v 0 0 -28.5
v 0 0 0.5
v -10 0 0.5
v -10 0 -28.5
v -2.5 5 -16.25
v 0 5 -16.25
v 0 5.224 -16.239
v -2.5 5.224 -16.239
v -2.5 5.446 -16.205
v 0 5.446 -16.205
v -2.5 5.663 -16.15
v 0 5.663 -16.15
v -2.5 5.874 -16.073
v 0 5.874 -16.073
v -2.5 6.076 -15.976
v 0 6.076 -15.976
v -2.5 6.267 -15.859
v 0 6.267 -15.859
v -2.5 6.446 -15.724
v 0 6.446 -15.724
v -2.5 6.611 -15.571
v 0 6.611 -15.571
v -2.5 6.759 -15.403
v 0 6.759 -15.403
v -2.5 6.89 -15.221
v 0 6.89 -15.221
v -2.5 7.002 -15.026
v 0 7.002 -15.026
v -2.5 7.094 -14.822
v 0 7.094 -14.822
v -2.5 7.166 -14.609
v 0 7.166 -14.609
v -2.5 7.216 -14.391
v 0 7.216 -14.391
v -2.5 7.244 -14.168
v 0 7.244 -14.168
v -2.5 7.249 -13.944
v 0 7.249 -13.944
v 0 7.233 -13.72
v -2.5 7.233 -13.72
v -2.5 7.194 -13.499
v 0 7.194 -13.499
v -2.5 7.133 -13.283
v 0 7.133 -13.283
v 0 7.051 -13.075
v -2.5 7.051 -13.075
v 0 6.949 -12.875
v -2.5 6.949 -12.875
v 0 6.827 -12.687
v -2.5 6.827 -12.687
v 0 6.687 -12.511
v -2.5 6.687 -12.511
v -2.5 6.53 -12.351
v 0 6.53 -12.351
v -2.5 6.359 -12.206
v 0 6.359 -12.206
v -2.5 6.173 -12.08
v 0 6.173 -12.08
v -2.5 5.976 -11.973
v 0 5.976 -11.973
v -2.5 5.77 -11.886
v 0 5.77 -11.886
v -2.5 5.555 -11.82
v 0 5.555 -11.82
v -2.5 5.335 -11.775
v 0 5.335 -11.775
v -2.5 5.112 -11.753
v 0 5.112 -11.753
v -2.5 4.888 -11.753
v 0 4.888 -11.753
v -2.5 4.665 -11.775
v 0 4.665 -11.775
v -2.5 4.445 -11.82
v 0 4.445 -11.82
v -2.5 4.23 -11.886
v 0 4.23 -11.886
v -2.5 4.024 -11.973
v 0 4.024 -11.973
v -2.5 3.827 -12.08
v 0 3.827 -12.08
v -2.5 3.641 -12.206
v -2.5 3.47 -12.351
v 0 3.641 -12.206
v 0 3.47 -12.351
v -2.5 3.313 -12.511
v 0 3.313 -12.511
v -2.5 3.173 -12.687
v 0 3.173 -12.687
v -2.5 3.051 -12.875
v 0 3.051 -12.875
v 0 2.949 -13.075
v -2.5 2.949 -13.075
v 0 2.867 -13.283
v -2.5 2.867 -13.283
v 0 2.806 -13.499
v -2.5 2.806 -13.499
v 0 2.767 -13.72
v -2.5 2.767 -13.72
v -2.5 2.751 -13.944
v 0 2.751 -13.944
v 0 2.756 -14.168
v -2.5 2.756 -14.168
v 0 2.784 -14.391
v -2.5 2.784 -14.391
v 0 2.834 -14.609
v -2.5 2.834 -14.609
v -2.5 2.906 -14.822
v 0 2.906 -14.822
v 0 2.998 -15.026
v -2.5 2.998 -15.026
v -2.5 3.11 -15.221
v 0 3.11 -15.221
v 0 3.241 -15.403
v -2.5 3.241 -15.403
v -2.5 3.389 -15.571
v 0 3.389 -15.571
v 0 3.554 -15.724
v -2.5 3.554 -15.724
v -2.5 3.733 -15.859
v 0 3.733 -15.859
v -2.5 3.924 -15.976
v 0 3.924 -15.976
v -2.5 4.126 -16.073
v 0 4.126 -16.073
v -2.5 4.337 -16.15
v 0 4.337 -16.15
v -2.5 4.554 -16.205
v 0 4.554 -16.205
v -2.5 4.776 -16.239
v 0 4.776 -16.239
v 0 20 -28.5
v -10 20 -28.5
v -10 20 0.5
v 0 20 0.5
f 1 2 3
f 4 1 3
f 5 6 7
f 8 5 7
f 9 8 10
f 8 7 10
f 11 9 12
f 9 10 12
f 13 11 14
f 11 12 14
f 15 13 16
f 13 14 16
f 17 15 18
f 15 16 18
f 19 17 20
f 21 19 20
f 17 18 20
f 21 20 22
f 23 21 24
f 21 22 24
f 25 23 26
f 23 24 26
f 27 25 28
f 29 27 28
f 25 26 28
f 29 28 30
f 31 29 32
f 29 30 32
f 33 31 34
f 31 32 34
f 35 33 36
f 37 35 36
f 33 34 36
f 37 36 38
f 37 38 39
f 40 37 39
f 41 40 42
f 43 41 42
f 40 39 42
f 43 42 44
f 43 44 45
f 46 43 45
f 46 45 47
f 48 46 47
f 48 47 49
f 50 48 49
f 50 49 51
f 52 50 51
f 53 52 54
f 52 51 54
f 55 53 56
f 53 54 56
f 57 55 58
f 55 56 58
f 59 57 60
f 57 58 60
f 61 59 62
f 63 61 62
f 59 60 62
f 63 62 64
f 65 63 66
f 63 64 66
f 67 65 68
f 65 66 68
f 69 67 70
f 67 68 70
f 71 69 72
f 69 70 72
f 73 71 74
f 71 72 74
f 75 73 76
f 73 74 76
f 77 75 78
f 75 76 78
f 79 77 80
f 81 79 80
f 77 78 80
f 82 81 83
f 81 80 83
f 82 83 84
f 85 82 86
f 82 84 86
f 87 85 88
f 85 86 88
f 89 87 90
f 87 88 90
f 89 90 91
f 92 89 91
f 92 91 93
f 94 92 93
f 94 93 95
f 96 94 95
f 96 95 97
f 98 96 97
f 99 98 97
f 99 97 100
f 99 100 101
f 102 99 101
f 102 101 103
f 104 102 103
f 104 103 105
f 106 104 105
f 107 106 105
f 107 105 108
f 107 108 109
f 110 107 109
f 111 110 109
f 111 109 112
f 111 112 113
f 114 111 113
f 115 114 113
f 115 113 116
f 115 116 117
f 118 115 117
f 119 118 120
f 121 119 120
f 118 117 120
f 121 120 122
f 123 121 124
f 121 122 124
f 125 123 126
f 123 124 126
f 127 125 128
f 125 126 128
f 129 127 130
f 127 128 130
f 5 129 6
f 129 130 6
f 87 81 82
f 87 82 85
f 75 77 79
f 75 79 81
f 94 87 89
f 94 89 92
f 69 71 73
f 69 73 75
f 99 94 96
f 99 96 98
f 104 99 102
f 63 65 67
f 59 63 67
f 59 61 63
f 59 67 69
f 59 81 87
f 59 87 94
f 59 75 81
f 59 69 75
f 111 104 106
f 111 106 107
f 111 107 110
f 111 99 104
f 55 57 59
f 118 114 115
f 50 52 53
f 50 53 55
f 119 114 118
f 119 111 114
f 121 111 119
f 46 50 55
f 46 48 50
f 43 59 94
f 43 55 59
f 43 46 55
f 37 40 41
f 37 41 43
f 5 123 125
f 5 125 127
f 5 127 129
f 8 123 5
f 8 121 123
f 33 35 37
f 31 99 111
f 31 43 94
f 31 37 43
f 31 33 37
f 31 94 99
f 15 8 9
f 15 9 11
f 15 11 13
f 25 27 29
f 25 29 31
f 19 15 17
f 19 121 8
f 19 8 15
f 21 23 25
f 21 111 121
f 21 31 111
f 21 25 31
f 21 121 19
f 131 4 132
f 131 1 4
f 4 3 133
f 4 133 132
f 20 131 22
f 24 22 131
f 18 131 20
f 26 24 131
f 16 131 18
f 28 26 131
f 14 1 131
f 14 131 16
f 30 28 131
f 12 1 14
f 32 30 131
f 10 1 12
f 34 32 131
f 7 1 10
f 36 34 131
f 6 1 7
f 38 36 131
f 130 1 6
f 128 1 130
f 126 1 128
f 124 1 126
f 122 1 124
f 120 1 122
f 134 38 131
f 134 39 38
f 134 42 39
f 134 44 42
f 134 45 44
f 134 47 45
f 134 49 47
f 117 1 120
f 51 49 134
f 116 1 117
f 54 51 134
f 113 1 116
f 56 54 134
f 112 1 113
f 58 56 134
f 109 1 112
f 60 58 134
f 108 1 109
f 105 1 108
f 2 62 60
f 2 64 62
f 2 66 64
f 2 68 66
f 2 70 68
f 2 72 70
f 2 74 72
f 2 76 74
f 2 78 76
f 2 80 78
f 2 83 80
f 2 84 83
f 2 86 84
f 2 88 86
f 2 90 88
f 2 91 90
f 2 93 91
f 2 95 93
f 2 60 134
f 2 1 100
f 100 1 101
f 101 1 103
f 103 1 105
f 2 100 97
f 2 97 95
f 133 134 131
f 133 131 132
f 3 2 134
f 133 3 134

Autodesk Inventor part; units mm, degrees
ref_plane "YZ Plane" through (0, 0, 0) normal (1, 0, 0) x (0, 1, 0)
ref_plane "XZ Plane" through (0, 0, 0) normal (0, 1, 0) x (-1, 0, 0)
ref_plane "XY Plane" through (0, 0, 0) normal (0, 0, 1) x (1, 0, 0)
sketch "Sketch1" plane through (0, 0, 0) normal (0, 1, 0) x (-1, 0, 0)
  line L0 (0, 0) -> (10, 0)
  line L1 (10, 0) -> (10, -28)
  line L2 (10, -28) -> (0, -28)
  line L3 (0, -28) -> (0, 0)
extrude "Extrusion1" add sketch "Sketch1" along normal blind 20
sketch "Sketch6" plane through (0, 0, 0) normal (1, 0, 0) x (0, 0, -1)
  point P0 (0, 0)
sketch "Sketch7" plane through (0, 0, 0) normal (1, 0, 0) x (0, 0, -1)
  circle A0 centre (14, 5) radius 2.25
  point P0 (0, 0)
  dimension "d14" = 4.5
extrude "Extrusion6" cut sketch "Sketch7" against normal blind 2.5
sketch "Sketch8" plane through (0, 0, 0) normal (1, 0, 0) x (0, 0, -1)
  line L0 (0, 0) -> (0, 20) projected
  line L1 (0, 0) -> (-0.5, 0)
  line L2 (-0.5, 0) -> (-0.5, 20)
  line L3 (-0.5, 20) -> (0, 20)
  line L4 (0, 20) -> (0, 0)
  line L5 (28, 0) -> (28.5, 0)
  line L6 (28.5, 0) -> (28.5, 20)
  line L7 (28.5, 20) -> (28, 20)
  line L8 (28, 20) -> (28, 0)
  dimension "d17" = 0.5
  dimension "d18" = 0.5
extrude "Extrusion7" add sketch "Sketch8" against normal blind 10
properties part number "Kolv"
